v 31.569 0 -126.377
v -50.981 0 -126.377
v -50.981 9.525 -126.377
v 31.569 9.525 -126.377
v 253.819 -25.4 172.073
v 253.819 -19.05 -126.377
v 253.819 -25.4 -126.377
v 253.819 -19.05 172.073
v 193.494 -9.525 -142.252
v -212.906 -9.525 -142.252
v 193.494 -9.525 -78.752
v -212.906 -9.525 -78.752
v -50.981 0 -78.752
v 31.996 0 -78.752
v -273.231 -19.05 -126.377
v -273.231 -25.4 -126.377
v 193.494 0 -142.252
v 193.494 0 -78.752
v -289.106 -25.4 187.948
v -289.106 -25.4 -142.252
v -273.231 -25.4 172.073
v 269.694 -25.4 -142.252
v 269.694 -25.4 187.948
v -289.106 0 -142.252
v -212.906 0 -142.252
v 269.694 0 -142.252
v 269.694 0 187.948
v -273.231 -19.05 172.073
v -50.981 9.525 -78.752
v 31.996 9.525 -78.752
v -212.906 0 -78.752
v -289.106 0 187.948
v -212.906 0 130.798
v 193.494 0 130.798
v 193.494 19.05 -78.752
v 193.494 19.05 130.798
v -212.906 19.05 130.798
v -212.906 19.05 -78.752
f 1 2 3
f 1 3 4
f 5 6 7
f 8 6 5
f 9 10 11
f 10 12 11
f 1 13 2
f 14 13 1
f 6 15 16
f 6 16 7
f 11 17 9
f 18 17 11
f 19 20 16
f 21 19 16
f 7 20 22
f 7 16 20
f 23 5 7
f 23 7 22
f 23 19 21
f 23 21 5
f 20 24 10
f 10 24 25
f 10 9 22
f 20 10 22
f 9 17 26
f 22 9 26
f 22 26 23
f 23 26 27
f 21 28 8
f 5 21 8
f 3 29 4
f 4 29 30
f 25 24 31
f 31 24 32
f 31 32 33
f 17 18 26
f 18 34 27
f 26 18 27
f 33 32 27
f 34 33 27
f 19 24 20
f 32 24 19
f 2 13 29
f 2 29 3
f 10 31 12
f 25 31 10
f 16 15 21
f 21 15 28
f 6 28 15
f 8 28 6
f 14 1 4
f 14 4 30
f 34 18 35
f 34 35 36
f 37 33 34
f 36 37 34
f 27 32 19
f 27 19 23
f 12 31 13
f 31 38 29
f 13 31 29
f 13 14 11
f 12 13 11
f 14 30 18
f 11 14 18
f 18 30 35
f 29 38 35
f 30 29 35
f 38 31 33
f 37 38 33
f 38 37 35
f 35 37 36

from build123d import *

# Parameters (mm, degrees)
F0_W     = 558.8
F0_H     = 330.2
F0_W_2   = 527.05
F0_H_2   = 298.45
F1_DEPTH = 25.4
F2_DEPTH = 19.05
F3_W     = 406.4
F3_H     = 209.55
F4_DEPTH = 19.05
F5_W     = 406.4
F5_H     = 15.875
F5_H_2   = 47.625
F6_DEPTH = 9.525
F8_DEPTH = 9.525


with BuildPart() as f1:
    # F0 (on Front) → F1 (new body)
    with BuildSketch(Plane.XZ):
        with Locations((-9.705722, 22.848336)):
            Rectangle(F0_W, F0_H)
        with Locations((-9.705722, 22.848336)):
            Rectangle(F0_W_2, F0_H_2, mode=Mode.SUBTRACT)
    extrude(amount=F1_DEPTH)

    # F0 (on Front) → F2 (join)
    with BuildSketch(Plane.XZ):
        with Locations((-9.705722, 22.848336)):
            Rectangle(F0_W_2, F0_H_2)
    extrude(amount=F2_DEPTH)

    # F3 (on face) → F4 (join)
    with BuildSketch(Plane.XZ):
        with Locations((-9.705722, 26.023336)):
            Rectangle(F3_W, F3_H)
    extrude(amount=-F4_DEPTH)

    # F5 (on face) → F6 (cut)
    with BuildSketch(Plane.XZ):
        with Locations((-9.705722, -134.314164)):
            Rectangle(F5_W, F5_H)
        with Locations((-9.705722, -102.564164)):
            Rectangle(F5_W, F5_H_2)
    extrude(amount=F6_DEPTH, mode=Mode.SUBTRACT)

    # F7 (on face) → F8 (join)
    with BuildSketch(Plane.XZ):
        Polygon((-50.980722, -126.376664), (31.569278, -126.376664), (31.996309, -78.751664), (31.569278, -78.751664), (-50.980722, -78.751664), align=None)
    extrude(amount=-F8_DEPTH)


solid = f1.part
